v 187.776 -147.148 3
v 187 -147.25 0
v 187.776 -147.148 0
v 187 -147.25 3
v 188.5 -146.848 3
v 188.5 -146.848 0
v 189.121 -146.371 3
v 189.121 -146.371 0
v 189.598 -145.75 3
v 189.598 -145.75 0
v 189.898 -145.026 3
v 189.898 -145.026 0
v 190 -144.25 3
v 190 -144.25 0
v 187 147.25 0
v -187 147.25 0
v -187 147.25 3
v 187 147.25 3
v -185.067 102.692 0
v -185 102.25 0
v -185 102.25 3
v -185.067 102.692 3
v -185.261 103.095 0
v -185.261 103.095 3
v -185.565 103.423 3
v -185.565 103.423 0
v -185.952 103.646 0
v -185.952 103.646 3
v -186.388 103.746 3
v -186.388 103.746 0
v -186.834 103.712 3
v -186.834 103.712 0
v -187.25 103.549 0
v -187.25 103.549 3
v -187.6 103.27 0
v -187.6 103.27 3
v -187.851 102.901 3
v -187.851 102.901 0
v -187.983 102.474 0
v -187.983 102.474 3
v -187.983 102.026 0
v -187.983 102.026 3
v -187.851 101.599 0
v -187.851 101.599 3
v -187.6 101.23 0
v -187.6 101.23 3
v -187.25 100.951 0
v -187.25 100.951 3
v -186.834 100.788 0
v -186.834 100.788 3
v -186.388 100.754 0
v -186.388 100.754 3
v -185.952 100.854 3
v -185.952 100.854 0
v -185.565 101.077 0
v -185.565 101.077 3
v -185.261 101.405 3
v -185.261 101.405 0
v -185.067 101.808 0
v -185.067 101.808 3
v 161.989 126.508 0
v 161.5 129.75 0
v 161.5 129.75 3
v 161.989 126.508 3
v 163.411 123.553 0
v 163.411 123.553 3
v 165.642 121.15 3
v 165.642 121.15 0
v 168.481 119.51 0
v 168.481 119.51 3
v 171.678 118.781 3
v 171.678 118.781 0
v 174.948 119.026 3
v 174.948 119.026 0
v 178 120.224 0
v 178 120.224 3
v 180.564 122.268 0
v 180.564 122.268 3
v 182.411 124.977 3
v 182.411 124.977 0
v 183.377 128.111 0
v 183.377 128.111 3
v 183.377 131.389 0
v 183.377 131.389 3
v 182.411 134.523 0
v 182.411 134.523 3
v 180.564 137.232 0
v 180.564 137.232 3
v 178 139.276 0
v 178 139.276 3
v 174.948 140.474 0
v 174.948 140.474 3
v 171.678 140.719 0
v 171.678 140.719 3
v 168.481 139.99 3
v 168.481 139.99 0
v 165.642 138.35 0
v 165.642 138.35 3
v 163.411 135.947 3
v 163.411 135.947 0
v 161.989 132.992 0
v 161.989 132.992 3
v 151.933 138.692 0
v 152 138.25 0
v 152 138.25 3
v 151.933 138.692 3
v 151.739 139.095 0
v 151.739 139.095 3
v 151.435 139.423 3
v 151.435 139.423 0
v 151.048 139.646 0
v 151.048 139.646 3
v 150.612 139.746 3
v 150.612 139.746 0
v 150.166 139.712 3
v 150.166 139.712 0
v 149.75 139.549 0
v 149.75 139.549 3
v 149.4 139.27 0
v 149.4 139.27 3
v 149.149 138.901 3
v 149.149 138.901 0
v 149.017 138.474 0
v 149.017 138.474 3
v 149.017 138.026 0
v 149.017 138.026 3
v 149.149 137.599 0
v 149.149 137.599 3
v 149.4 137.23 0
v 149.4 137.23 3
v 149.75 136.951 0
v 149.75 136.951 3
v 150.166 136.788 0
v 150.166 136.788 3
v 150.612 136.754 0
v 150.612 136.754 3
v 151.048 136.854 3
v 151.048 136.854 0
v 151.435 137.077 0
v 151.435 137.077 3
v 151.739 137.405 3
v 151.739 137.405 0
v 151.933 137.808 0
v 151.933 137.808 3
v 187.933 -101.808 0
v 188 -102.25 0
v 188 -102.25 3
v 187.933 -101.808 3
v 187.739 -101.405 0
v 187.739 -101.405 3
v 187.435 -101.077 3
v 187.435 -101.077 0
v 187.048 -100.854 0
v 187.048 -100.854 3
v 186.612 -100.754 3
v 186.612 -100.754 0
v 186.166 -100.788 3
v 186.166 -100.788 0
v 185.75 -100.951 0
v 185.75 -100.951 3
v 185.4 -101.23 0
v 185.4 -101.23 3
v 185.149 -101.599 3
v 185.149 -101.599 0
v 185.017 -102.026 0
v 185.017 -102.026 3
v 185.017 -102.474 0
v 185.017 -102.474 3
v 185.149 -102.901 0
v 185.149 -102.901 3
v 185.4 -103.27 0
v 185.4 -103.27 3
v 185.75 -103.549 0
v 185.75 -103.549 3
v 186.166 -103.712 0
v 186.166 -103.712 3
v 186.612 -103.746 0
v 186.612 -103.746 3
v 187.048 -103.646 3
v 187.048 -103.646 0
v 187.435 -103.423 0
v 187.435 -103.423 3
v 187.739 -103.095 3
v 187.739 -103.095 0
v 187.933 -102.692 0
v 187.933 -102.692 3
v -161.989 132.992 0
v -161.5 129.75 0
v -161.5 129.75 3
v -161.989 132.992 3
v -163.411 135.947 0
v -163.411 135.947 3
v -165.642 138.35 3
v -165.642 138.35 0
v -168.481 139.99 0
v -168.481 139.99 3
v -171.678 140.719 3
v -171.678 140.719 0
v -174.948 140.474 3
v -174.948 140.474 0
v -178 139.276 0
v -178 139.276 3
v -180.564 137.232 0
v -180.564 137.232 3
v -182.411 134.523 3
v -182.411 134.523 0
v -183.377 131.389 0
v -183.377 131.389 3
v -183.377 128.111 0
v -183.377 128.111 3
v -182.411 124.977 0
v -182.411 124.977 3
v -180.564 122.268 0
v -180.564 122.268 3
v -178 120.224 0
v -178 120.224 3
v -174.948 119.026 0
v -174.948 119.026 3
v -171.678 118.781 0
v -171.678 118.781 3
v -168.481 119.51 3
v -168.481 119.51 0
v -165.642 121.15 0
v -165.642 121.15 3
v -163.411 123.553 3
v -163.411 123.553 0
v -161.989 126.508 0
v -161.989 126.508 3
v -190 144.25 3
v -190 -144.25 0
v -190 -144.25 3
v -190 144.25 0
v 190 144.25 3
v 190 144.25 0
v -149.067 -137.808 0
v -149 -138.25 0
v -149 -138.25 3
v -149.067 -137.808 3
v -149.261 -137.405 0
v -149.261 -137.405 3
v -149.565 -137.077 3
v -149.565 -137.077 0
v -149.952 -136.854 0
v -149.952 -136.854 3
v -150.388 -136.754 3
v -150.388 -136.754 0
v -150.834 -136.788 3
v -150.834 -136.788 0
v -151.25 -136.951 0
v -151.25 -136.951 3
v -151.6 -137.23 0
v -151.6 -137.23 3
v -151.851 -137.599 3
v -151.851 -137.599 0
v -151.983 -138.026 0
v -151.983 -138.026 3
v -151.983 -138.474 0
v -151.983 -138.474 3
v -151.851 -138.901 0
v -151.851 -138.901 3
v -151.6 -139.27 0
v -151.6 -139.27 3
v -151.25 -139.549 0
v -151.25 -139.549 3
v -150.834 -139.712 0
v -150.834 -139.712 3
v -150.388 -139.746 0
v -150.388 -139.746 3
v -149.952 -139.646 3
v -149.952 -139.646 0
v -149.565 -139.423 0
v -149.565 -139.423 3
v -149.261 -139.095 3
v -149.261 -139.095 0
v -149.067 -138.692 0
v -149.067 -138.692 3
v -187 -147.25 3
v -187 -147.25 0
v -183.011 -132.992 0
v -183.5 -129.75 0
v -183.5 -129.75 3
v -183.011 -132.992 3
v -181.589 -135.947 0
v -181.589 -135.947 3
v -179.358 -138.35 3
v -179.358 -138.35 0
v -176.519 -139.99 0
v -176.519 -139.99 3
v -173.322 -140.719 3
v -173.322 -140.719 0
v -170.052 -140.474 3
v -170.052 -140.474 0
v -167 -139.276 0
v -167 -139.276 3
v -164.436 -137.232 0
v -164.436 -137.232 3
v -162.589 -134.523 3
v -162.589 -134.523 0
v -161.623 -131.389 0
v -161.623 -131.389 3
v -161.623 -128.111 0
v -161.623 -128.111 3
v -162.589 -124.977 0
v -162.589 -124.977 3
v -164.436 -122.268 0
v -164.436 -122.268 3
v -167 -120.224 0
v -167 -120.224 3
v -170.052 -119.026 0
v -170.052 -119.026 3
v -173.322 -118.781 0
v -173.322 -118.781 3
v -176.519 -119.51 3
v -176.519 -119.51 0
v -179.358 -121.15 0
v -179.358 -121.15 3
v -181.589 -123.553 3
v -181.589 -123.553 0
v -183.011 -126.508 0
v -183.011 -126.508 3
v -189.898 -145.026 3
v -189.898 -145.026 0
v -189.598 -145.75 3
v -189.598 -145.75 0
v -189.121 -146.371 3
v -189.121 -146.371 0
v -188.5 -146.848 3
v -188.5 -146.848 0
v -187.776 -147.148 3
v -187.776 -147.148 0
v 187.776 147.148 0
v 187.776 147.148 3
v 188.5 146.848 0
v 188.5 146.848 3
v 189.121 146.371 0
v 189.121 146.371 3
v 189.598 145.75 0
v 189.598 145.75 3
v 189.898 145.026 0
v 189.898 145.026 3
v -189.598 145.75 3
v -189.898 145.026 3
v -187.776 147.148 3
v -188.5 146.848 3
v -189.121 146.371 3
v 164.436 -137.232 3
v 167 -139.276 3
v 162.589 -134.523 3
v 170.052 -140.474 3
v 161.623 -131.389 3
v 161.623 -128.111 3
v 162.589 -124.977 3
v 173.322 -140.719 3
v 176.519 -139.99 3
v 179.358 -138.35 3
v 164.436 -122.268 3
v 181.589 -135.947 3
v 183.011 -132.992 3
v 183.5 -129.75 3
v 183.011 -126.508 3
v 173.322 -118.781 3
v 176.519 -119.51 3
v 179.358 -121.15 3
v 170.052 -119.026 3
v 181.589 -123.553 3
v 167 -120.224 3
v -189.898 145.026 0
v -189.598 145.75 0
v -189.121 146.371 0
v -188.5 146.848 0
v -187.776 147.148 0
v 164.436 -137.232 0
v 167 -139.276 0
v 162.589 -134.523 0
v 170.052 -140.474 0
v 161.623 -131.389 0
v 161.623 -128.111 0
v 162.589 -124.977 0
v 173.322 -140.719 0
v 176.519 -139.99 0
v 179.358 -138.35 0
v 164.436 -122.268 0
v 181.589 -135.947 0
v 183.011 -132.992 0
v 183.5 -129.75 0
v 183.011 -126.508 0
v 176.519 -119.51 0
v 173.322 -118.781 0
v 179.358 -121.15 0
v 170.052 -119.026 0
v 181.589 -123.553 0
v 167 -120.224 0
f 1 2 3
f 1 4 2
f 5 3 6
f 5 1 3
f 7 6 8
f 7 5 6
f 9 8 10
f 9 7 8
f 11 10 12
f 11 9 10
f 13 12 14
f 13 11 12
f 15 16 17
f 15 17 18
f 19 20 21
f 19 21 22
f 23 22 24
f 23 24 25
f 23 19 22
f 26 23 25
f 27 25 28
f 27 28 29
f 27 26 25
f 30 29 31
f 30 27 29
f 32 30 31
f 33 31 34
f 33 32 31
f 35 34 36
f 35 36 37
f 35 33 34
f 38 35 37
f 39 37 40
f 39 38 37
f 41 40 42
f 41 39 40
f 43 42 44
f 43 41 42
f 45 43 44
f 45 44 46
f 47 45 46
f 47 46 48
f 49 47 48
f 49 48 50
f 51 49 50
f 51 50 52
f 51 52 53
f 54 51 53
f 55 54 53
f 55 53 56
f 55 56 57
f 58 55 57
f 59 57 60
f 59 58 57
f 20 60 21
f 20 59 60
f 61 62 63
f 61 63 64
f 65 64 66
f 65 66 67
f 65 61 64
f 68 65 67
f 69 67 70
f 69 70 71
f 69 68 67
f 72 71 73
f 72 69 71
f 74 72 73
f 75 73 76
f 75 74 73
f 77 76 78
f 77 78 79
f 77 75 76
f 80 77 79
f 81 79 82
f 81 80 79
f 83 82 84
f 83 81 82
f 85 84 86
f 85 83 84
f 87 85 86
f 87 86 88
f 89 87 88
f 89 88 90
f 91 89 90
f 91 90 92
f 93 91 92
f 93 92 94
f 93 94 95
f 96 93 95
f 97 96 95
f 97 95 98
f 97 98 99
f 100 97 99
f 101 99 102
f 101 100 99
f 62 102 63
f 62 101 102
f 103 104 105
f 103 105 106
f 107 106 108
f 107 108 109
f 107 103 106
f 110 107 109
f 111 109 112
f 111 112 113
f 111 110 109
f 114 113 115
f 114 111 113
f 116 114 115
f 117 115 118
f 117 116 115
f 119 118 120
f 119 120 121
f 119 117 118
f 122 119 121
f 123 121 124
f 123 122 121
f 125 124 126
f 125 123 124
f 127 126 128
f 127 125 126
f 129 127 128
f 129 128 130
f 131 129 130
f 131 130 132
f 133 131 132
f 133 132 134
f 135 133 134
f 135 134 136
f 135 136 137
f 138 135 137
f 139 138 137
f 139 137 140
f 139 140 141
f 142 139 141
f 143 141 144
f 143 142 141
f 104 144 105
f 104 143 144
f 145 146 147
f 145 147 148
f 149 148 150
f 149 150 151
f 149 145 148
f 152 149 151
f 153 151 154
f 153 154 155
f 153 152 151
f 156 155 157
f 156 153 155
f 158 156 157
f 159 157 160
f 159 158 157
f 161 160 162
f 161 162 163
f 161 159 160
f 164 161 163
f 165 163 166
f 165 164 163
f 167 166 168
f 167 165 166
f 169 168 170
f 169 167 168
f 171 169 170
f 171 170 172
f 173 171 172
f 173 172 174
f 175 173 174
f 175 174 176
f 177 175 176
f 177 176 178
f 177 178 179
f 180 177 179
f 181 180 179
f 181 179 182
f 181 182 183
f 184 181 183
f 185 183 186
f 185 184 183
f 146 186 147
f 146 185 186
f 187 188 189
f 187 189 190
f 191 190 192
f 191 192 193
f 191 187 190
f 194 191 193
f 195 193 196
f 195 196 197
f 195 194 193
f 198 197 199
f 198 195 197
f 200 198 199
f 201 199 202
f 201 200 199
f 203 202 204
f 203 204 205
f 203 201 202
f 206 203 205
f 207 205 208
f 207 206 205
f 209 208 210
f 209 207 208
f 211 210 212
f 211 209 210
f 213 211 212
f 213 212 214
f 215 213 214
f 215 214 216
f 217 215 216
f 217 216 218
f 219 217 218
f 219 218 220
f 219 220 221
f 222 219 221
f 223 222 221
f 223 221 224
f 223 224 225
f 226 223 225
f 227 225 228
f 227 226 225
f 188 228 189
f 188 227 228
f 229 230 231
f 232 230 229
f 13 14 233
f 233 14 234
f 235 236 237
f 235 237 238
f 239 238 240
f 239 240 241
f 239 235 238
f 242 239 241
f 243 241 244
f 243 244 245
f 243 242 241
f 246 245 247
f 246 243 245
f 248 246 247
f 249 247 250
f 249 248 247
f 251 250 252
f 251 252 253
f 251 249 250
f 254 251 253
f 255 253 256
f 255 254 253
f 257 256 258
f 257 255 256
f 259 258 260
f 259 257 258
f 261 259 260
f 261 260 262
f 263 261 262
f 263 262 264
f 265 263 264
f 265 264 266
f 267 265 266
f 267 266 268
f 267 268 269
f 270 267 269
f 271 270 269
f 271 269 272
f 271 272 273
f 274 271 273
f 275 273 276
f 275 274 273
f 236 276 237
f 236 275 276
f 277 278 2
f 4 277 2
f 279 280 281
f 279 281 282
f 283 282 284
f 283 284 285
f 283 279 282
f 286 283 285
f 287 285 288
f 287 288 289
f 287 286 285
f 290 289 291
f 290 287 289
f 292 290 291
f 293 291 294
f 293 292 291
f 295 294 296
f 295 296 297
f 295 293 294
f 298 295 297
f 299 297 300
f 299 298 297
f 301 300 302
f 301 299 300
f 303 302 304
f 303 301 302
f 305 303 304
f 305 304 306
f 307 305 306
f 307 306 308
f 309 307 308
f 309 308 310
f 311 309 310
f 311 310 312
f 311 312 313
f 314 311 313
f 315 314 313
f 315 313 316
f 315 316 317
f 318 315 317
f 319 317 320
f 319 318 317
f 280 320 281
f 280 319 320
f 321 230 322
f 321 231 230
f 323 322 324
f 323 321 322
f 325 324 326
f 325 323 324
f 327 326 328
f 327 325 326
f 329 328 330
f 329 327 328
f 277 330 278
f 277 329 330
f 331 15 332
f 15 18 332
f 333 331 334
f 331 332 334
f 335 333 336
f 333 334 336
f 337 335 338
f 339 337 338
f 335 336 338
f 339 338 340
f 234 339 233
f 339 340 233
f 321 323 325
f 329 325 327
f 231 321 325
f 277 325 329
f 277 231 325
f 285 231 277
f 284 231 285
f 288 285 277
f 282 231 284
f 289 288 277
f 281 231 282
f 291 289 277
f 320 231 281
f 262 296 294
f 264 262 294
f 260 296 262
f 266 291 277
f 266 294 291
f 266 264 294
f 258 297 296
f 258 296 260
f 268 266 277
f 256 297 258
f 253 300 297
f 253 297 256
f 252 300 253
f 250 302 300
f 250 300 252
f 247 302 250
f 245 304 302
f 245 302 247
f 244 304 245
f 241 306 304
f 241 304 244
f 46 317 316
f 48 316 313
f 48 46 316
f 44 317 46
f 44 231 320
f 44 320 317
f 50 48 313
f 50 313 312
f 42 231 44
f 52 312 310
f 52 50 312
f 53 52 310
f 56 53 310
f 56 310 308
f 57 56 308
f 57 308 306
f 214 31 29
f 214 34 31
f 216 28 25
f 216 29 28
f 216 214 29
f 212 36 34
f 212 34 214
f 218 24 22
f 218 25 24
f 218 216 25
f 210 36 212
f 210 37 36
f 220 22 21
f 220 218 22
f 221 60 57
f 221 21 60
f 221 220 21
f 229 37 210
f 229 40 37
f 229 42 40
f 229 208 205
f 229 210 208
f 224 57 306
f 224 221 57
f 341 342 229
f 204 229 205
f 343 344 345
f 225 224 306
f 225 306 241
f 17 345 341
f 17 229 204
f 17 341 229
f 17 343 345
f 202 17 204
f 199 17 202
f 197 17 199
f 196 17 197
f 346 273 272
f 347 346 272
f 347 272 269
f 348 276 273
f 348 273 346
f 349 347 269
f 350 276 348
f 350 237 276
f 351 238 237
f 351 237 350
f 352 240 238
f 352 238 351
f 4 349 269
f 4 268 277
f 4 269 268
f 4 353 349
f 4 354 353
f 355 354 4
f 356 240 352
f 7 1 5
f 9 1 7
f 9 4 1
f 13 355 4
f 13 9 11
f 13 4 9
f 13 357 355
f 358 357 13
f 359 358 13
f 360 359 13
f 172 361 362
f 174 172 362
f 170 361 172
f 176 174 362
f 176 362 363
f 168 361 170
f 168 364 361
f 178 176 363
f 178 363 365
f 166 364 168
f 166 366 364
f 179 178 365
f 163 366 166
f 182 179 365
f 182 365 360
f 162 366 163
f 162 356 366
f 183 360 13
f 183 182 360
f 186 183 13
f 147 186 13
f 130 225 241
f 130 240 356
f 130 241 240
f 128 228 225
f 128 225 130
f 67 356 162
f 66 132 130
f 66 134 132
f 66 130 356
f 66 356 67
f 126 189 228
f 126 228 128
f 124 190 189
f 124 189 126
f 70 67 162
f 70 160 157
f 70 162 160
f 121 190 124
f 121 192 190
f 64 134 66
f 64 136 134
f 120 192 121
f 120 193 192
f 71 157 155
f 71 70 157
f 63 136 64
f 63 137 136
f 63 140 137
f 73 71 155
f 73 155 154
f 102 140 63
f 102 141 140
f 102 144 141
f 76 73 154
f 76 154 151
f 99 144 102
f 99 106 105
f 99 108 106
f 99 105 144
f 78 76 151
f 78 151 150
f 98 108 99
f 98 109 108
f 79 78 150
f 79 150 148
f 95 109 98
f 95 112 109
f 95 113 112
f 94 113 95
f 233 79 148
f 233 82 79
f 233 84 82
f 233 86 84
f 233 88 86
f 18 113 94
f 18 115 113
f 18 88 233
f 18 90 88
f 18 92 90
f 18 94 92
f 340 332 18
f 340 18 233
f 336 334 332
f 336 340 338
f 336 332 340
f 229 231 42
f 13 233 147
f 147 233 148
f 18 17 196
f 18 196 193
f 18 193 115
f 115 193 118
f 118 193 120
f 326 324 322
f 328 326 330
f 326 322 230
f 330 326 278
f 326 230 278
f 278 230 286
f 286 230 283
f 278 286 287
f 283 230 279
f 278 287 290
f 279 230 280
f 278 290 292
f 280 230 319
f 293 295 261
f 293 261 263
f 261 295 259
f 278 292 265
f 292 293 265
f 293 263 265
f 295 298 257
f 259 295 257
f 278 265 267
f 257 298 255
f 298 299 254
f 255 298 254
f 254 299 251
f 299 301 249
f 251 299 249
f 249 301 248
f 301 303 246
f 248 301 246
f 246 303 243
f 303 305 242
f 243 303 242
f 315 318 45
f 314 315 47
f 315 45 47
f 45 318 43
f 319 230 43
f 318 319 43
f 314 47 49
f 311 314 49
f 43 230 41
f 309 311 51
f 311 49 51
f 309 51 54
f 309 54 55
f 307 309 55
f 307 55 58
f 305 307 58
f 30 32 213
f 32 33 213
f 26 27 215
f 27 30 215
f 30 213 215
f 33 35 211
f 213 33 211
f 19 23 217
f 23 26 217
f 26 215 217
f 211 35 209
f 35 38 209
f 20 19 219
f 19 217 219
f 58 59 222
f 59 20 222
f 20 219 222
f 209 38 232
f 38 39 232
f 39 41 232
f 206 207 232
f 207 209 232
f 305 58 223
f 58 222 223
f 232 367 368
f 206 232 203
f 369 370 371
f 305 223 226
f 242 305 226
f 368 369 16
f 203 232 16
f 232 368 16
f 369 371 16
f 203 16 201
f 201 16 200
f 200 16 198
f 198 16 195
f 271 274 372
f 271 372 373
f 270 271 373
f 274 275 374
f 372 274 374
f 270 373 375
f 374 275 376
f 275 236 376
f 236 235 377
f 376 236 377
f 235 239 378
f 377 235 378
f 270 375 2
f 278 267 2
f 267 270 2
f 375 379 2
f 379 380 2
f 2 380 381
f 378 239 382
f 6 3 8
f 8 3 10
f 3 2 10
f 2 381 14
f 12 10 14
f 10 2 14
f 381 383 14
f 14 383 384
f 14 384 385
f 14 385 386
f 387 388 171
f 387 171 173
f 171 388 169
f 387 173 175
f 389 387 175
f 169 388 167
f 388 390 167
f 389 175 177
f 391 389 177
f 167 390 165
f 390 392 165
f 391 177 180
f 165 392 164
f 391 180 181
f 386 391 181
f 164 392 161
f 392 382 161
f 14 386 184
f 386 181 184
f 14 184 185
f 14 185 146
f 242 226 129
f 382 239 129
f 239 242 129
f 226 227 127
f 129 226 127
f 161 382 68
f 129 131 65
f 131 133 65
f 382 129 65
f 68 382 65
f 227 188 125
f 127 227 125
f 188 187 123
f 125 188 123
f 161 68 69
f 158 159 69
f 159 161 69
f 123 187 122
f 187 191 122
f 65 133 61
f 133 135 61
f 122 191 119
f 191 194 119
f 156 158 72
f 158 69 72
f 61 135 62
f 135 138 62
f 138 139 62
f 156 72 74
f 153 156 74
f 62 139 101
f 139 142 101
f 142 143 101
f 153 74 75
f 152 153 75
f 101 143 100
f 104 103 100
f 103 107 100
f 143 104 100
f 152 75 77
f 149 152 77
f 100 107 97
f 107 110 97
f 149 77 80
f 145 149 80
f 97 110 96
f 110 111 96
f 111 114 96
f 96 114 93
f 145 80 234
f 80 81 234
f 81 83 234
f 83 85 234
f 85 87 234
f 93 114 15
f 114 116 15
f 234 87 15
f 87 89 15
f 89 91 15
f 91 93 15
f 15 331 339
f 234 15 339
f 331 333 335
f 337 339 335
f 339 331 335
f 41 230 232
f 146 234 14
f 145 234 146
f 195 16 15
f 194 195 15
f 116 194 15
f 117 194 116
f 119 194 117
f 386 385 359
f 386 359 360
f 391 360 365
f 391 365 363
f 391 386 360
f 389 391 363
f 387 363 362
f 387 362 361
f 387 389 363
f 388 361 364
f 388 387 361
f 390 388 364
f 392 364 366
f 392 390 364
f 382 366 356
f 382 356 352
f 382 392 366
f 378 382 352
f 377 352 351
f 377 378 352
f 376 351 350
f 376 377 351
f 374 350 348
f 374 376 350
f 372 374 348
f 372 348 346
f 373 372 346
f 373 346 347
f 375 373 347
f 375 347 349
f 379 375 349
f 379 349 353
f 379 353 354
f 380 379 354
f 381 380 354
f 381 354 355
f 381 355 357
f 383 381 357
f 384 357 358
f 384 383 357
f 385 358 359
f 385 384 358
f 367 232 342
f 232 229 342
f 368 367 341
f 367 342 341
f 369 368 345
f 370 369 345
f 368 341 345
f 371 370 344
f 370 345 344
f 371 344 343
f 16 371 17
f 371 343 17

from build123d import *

# Parameters (mm, degrees)
SKETCH1_W           = 380
SKETCH1_H           = 294.5
SKETCH1_R           = 11
SKETCH1_R_2         = 1.5
BOSS_EXTRUDE1_DEPTH = 3
FILLET1_R           = 3


with BuildPart() as part:
    # Sketch1 → Boss-Extrude1 (new body)
    with BuildSketch(Plane.XY):
        Rectangle(SKETCH1_W, SKETCH1_H)
        with Locations((-172.5, 129.75)):
            Circle(SKETCH1_R, mode=Mode.SUBTRACT)
        with Locations(Location((172.5, 129.75, 0), (0, 0, 180))):
            Circle(SKETCH1_R, mode=Mode.SUBTRACT)
        with Locations((172.5, -129.75)):
            Circle(SKETCH1_R, mode=Mode.SUBTRACT)
        with Locations(Location((-172.5, -129.75, 0), (0, 0, 180))):
            Circle(SKETCH1_R, mode=Mode.SUBTRACT)
        with Locations((150.5, 138.25)):
            Circle(SKETCH1_R_2, mode=Mode.SUBTRACT)
        with Locations((-186.5, 102.25)):
            Circle(SKETCH1_R_2, mode=Mode.SUBTRACT)
        with Locations((-150.5, -138.25)):
            Circle(SKETCH1_R_2, mode=Mode.SUBTRACT)
        with Locations((186.5, -102.25)):
            Circle(SKETCH1_R_2, mode=Mode.SUBTRACT)
    extrude(amount=BOSS_EXTRUDE1_DEPTH)

    # Fillet1
    fillet1_edges = [part.edges().sort_by_distance(p)[0] for p in [
        (-190, 147.25, 1.5),
        (190, 147.25, 1.5),
        (190, -147.25, 1.5),
        (-190, -147.25, 1.5),
    ]]
    fillet(fillet1_edges, radius=FILLET1_R)


solid = part.part
